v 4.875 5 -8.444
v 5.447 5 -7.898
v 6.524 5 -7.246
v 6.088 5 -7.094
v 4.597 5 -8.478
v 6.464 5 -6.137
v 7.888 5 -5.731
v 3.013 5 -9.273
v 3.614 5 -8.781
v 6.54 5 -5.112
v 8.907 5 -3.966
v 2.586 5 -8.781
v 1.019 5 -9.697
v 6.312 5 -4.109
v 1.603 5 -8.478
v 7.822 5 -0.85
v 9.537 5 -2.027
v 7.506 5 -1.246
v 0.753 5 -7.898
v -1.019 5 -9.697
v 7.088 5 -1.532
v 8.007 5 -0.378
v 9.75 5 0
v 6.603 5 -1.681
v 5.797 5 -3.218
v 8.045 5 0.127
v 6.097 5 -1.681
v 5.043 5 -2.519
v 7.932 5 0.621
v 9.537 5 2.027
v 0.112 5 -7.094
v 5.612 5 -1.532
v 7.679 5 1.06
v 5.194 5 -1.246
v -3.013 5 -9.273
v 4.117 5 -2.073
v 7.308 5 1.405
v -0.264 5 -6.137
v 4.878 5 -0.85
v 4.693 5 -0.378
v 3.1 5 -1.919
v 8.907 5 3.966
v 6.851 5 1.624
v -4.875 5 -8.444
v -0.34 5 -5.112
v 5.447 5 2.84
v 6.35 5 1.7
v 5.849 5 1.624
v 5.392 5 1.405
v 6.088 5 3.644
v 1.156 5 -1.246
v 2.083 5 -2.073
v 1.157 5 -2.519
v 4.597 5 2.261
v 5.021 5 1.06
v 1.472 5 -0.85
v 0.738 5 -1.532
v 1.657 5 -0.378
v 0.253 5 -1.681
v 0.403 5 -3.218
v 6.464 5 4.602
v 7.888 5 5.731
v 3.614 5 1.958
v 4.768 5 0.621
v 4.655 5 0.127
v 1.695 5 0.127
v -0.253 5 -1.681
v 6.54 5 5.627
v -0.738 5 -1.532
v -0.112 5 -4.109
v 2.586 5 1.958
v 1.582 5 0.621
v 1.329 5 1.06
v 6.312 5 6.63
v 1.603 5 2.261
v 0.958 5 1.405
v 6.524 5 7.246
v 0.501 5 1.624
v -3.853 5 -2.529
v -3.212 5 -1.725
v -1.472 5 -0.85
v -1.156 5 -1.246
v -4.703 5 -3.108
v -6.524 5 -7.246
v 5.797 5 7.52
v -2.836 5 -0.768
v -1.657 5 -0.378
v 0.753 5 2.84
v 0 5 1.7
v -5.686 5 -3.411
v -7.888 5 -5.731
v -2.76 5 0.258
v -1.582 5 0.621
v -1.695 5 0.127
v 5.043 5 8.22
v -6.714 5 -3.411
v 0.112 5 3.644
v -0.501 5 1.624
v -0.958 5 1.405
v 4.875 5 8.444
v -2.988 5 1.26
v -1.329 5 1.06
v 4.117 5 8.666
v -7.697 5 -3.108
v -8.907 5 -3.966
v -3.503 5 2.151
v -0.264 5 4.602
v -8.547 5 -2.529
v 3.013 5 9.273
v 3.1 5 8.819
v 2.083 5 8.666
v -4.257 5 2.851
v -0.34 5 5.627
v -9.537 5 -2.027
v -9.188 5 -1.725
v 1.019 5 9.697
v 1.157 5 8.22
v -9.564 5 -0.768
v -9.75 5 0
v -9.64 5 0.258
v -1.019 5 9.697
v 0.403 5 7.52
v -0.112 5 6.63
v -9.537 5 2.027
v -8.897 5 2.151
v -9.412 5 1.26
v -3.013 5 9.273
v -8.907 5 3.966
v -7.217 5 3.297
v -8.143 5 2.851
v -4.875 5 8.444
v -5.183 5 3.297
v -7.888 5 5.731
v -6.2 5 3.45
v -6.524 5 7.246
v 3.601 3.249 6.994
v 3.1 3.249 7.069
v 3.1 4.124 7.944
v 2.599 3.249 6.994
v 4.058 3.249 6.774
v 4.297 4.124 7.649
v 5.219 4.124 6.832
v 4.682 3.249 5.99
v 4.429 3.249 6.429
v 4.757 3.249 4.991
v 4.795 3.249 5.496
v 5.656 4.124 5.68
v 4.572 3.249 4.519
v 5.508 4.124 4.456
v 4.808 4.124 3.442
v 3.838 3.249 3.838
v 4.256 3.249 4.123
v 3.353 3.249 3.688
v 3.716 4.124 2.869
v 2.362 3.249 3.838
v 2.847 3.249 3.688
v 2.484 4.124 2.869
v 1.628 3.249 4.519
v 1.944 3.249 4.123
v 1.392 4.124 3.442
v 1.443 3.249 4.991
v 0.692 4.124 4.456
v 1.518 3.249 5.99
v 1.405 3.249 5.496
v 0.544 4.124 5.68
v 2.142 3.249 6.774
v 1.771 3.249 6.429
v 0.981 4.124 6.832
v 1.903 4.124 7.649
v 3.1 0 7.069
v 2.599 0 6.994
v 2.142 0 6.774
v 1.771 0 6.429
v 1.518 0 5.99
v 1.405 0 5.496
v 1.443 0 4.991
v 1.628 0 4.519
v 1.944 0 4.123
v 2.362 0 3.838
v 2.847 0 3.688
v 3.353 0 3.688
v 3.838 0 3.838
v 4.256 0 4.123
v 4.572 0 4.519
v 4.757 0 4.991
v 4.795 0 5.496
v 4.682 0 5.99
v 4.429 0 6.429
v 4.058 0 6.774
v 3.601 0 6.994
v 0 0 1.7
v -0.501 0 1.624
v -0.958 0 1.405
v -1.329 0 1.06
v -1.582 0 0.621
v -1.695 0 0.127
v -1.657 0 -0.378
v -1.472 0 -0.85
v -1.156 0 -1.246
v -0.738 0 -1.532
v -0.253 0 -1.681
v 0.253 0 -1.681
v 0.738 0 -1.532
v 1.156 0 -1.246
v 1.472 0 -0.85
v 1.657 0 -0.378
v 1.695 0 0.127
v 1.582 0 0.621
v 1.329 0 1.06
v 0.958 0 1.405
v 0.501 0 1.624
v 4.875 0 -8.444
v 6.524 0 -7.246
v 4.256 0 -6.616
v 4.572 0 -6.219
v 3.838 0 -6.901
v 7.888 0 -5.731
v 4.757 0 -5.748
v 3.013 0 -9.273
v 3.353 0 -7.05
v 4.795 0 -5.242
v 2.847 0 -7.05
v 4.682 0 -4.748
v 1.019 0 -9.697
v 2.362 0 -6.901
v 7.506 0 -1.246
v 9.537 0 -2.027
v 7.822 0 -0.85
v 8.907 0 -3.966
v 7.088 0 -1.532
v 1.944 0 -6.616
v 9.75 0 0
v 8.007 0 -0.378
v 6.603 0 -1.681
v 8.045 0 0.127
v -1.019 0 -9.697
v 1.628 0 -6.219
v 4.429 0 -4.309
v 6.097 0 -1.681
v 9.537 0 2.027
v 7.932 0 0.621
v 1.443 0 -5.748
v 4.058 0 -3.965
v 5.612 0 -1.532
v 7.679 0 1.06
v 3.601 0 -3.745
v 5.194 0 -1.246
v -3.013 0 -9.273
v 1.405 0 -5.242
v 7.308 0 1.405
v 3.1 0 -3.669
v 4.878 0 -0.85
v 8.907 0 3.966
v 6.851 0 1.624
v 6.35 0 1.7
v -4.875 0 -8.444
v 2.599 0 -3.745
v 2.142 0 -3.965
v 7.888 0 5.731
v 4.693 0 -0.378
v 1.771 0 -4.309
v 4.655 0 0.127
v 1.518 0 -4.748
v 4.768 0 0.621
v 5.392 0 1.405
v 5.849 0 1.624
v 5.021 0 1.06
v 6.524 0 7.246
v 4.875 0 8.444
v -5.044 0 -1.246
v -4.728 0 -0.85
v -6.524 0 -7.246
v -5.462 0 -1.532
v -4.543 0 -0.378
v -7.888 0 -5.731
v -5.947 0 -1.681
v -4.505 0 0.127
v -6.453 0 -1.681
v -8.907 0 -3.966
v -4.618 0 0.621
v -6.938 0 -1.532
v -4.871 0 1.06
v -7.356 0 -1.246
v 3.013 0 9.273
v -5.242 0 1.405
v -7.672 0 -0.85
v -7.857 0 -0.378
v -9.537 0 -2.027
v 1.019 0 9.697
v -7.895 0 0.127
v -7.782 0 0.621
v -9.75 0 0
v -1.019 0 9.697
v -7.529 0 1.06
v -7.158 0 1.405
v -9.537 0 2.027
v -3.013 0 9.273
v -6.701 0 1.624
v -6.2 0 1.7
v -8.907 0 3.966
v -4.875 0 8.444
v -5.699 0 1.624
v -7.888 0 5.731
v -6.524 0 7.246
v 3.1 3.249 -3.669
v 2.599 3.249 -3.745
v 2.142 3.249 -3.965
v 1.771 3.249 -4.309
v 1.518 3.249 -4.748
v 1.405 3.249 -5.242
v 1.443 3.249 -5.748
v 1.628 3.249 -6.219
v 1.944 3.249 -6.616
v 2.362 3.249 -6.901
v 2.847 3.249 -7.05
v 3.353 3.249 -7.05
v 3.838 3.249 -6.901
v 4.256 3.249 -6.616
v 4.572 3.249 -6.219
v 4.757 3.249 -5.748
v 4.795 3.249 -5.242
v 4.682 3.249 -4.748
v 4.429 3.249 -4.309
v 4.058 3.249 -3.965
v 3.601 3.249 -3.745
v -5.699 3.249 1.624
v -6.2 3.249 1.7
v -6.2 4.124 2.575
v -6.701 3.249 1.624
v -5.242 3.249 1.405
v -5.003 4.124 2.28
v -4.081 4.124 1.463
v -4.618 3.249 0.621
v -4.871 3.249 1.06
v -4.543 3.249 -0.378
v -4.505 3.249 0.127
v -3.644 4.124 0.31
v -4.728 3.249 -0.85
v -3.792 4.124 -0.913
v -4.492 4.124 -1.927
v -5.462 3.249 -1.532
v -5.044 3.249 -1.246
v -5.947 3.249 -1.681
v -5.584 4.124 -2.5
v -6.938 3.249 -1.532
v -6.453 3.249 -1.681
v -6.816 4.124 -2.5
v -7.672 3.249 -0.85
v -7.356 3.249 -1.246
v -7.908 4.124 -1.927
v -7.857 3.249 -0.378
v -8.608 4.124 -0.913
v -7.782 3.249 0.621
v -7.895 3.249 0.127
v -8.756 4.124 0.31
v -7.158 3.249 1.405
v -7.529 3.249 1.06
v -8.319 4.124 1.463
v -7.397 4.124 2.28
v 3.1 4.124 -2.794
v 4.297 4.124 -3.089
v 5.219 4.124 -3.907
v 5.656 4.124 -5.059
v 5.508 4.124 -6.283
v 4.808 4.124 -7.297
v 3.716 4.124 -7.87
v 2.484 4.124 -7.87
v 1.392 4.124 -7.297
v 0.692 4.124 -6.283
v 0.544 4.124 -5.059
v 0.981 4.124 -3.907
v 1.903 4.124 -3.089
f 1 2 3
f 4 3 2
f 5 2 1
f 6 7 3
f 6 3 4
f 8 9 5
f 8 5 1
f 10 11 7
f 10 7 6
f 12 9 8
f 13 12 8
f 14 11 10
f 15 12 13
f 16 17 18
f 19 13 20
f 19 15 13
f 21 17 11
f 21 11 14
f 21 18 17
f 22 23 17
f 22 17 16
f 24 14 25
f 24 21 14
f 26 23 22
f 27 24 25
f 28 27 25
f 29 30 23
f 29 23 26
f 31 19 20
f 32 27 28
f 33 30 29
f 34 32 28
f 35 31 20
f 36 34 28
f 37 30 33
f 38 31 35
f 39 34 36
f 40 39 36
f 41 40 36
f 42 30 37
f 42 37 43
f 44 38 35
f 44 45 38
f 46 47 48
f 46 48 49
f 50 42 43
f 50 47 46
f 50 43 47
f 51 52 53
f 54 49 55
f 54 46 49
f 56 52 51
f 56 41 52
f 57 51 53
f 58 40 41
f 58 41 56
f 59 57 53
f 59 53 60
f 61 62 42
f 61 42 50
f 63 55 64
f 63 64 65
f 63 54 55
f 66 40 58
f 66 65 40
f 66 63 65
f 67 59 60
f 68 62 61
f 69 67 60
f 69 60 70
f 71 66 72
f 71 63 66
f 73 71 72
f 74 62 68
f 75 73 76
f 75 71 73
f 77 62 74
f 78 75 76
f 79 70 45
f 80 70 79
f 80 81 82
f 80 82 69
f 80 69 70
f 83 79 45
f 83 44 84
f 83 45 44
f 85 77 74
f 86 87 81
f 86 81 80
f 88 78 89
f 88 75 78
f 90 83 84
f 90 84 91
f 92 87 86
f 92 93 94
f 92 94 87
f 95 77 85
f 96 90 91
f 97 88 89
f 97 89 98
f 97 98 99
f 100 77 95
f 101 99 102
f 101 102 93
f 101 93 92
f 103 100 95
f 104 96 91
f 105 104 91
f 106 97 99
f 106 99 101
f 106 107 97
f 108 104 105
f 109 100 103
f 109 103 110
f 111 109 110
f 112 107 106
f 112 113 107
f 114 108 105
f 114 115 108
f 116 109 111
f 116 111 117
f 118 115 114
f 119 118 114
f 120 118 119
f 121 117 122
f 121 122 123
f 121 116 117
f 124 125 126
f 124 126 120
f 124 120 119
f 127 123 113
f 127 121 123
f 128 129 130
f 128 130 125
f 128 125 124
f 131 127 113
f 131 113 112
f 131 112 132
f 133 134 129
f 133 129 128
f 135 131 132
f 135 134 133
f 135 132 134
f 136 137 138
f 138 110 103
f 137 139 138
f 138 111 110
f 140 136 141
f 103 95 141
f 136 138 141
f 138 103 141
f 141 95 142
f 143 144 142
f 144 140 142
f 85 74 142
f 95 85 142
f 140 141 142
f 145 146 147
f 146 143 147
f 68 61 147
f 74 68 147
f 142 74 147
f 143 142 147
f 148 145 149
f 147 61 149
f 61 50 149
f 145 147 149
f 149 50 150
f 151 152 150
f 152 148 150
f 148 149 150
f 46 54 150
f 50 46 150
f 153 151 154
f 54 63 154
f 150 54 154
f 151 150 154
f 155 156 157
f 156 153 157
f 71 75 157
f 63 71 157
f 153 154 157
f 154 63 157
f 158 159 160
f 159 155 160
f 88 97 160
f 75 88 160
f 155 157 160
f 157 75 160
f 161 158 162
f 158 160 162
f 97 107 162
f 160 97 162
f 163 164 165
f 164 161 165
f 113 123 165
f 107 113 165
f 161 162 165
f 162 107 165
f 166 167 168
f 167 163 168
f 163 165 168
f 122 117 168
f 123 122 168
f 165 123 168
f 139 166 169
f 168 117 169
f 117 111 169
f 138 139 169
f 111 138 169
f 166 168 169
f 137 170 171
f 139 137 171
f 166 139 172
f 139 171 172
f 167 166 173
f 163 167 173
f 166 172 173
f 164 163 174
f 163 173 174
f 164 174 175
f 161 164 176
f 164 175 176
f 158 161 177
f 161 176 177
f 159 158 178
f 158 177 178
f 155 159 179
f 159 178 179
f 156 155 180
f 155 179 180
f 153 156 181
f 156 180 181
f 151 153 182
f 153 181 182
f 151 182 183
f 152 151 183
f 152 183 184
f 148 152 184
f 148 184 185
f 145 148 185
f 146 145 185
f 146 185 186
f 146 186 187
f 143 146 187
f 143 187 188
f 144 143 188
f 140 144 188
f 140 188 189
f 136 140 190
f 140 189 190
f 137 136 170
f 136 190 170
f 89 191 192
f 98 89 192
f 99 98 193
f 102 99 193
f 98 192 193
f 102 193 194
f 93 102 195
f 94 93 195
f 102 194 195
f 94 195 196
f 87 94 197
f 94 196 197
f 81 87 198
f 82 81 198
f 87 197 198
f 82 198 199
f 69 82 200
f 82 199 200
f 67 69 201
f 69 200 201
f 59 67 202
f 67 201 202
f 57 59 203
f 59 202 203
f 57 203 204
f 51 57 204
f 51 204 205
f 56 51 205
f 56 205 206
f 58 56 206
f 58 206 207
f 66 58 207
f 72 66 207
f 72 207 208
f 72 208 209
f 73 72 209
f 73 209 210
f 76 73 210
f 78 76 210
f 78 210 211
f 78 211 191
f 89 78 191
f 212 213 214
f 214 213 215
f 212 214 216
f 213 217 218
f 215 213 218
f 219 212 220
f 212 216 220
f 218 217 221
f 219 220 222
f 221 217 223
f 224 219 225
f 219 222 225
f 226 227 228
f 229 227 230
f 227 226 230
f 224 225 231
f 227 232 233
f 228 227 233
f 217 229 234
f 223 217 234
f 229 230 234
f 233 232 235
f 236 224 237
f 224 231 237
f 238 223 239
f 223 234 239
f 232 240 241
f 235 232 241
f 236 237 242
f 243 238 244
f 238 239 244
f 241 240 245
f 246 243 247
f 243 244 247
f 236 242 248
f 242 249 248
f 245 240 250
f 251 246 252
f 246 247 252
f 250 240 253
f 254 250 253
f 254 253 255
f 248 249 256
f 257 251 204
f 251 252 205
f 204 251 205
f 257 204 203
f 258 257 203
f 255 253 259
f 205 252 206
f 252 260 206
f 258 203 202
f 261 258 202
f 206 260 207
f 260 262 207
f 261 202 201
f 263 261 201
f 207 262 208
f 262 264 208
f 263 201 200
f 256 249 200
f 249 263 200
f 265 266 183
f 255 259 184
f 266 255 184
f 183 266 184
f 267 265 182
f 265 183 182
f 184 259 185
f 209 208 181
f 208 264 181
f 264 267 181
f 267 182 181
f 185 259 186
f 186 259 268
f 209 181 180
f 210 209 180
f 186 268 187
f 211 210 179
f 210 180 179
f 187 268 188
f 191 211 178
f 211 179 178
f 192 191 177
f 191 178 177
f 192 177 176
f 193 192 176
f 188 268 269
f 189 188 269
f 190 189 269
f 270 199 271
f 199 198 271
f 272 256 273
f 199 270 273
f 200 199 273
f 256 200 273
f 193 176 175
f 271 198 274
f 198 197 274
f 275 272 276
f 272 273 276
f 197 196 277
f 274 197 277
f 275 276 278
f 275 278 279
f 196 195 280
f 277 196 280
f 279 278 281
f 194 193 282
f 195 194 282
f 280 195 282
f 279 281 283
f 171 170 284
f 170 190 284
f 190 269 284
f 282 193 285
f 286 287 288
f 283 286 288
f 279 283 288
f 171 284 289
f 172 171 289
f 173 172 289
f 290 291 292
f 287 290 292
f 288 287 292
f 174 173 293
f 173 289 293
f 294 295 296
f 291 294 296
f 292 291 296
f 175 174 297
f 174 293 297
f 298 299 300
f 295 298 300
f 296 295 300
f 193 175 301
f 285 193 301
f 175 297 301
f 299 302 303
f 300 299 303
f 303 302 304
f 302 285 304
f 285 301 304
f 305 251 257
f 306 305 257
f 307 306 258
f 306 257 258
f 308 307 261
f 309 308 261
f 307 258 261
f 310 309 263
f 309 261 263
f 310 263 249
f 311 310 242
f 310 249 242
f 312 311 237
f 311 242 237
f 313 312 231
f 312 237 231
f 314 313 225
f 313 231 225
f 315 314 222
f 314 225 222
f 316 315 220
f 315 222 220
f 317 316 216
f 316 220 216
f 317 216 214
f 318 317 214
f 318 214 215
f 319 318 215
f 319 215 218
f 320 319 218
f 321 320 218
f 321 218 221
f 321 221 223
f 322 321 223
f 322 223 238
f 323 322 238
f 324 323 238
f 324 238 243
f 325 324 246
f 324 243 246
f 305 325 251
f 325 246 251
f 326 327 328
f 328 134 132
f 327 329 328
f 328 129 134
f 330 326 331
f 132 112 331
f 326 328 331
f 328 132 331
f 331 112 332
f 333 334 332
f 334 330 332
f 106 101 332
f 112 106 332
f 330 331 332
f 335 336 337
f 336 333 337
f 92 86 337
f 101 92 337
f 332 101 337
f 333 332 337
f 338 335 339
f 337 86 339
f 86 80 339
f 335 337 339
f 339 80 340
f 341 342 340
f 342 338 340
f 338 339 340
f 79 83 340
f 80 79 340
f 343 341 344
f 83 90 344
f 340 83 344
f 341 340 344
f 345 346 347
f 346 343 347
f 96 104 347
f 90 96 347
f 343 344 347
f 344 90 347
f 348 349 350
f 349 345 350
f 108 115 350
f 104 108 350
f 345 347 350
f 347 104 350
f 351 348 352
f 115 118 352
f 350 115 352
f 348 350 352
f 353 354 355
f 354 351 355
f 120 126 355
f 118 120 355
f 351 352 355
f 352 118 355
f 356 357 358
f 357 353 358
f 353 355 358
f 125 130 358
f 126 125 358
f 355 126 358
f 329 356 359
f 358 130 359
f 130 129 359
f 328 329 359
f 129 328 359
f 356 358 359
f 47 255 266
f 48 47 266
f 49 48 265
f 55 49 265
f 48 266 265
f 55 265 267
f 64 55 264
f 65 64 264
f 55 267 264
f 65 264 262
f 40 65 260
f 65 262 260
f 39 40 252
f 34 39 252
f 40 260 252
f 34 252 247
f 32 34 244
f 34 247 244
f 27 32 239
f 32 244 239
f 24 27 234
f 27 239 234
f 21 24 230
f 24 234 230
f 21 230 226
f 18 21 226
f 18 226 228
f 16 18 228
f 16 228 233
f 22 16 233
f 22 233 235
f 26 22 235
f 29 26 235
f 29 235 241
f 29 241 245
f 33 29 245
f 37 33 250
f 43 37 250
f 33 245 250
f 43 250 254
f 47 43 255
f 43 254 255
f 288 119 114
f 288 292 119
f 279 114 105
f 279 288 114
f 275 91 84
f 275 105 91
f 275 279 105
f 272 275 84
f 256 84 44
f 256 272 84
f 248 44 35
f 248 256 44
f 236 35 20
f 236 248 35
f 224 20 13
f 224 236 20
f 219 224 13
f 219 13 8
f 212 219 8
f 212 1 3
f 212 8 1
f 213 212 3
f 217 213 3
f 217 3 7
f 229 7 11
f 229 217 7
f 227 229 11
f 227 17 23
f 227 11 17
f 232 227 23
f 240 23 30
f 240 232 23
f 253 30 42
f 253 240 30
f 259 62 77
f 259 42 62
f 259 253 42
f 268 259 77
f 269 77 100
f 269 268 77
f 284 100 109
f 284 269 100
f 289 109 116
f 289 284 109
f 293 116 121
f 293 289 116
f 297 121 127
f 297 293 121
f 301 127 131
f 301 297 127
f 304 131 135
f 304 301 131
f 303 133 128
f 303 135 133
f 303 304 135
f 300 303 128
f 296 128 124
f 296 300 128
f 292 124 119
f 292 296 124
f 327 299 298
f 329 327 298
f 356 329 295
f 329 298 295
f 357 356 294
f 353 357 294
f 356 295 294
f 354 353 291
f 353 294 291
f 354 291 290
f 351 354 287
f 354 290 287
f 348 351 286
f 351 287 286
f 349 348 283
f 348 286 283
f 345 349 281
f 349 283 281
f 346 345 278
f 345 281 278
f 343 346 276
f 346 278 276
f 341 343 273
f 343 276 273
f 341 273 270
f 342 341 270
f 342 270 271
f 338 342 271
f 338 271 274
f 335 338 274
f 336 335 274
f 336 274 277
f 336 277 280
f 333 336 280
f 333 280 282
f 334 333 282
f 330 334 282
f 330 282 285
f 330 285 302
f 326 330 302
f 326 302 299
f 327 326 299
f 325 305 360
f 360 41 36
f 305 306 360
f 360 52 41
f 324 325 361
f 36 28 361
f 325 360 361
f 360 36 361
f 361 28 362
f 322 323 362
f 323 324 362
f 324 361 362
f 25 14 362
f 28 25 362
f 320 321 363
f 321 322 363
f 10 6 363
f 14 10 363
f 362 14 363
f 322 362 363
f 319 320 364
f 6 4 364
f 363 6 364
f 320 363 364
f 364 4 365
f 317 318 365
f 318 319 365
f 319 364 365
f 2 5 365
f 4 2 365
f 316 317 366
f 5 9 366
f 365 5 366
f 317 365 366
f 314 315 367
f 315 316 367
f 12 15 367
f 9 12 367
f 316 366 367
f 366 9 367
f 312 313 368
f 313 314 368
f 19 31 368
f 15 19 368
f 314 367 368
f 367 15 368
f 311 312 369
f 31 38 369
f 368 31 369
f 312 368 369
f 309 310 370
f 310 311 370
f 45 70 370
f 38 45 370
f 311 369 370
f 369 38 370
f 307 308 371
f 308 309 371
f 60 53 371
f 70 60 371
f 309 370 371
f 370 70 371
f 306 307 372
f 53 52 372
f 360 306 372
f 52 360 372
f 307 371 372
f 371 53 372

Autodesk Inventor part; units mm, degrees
ref_plane "YZ Plane" through (0, 0, 0) normal (1, 0, 0) x (0, 1, 0)
ref_plane "XZ Plane" through (0, 0, 0) normal (0, 1, 0) x (-1, 0, 0)
ref_plane "XY Plane" through (0, 0, 0) normal (0, 0, 1) x (1, 0, 0)
sketch "Szkic1" plane through (0, 0, 0) normal (0, 1, 0) x (-1, 0, 0)
  circle A0 centre (0, 0) radius 9.75
  dimension "d0" = 19.5
extrude "Wyciągnięcie proste1" add sketch "Szkic1" along normal blind 5
sketch "Szkic2" plane through (0, 5, 0) normal (0, 1, 0) x (1, 0, 0)
  line L0 (0, 0) -> (-6.2, 0) construction
  line L1 (0, 0) -> (3.1, 5.3694) construction
  line L2 (0, 0) -> (3.1, -5.3694) construction
  dimension "d3" = 6.2
  dimension "d4" = 120
  dimension "d5" = 120
hole "Otwór1" at (-6.2, 5, 0) at (3.1, 5, -5.3694) at (3.1, 5, 5.3694) direction (0, -1, 0) diameter 3.4 end through all countersink diameter 6.9 countersink angle 89.954 clearance for "Śruba ze łbem stożkowym ISO 2009/7046" size "M3" standard "ISO"
sketch "Szkic3" plane through (0, 5, 0) normal (0, 1, 0) x (1, 0, 0)
  line L0 (0, 0) -> (6.35, 0)
  dimension "d13" = 6.35
hole "Otwór2" at (0, 5, 0) at (6.35, 5, 0) direction (0, -1, 0) diameter 3.4 end through all
properties part number "PrzejsciowkaDoFormy"
